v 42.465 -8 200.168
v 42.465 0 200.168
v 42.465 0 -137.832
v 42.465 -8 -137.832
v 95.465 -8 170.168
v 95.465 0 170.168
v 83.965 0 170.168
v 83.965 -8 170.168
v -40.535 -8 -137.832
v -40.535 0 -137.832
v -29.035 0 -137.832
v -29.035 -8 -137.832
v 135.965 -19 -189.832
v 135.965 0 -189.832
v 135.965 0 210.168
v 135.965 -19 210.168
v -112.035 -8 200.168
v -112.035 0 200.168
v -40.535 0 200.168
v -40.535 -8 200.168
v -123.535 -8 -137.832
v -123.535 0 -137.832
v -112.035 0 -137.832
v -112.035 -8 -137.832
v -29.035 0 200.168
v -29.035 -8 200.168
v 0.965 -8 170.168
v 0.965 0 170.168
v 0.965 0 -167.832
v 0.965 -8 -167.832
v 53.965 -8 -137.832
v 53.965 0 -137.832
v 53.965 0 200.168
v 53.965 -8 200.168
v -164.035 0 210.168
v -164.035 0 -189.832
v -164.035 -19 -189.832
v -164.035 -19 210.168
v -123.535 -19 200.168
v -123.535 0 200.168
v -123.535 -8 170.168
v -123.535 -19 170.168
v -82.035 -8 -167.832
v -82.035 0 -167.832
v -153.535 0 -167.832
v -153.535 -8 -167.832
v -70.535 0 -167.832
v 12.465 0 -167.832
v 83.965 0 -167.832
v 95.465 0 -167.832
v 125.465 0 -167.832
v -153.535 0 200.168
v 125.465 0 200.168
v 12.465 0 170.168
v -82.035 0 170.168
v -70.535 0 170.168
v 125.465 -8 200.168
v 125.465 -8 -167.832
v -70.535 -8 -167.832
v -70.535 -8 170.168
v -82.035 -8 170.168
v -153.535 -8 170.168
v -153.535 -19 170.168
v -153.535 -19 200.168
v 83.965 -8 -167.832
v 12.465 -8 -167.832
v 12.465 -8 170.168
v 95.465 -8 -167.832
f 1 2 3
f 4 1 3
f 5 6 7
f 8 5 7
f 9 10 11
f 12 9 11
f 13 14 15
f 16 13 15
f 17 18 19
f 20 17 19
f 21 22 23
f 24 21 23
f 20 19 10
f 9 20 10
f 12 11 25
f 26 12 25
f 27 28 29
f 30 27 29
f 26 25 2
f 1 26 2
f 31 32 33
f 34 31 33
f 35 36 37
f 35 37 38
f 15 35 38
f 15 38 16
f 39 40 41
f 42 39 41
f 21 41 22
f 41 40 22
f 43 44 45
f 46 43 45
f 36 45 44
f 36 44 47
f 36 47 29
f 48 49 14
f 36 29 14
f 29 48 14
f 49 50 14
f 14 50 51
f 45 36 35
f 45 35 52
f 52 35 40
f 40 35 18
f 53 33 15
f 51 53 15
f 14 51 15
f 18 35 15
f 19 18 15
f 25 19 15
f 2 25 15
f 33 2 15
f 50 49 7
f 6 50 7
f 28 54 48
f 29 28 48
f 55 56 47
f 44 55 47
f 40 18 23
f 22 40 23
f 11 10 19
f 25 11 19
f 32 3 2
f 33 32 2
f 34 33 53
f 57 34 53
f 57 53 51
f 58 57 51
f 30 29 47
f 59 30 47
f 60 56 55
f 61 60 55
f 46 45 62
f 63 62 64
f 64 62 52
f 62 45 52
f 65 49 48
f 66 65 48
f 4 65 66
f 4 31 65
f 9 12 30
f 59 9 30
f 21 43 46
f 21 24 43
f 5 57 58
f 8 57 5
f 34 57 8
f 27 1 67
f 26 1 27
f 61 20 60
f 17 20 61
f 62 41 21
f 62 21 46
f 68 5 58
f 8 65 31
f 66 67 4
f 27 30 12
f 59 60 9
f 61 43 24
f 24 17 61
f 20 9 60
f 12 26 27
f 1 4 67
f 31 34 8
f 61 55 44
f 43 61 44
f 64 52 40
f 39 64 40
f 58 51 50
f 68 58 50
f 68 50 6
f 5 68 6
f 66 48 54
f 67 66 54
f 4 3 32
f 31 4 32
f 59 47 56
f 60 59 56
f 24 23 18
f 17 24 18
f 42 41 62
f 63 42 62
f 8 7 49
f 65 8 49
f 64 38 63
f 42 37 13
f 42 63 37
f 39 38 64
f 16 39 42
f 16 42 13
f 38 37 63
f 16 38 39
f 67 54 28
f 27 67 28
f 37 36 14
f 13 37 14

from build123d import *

# Parameters (mm, degrees)
F0_W     = 300
F0_H     = 400
F1_DEPTH = 19
F3_DEPTH = 8
F4_W     = 30
F4_H     = 30
F5_DEPTH = 11


with BuildPart() as f1:
    # F0 (on Front) → F1 (new body)
    with BuildSketch(Plane.XZ):
        with Locations((-14.034653, 10.167784)):
            Rectangle(F0_W, F0_H)
    extrude(amount=F1_DEPTH)

    # F2 (on face) → F3 (cut)
    with BuildSketch(Plane(origin=(0, 0, 0), x_dir=(-1, 0, 0), z_dir=(0, 1, 0))):
        Polygon((-125.465347, 200.167784), (-125.465347, -167.832216), (-95.465347, -167.832216), (-95.465347, 170.167784), (-83.965347, 170.167784), (-83.965347, -167.832216), (-12.465347, -167.832216), (-12.465347, 170.167784), (-0.965347, 170.167784), (-0.965347, -167.832216), (70.534653, -167.832216), (70.534653, 170.167784), (82.034653, 170.167784), (82.034653, -167.832216), (153.534653, -167.832216), (153.534653, 200.167784), (123.534653, 200.167784), (123.534653, -137.832216), (112.034653, -137.832216), (112.034653, 200.167784), (40.534653, 200.167784), (40.534653, -137.832216), (29.034653, -137.832216), (29.034653, 200.167784), (-42.465347, 200.167784), (-42.465347, -137.832216), (-53.965347, -137.832216), (-53.965347, 200.167784), align=None)
    extrude(amount=-F3_DEPTH, mode=Mode.SUBTRACT)

    # F4 (on face) → F5 (cut)
    with BuildSketch(Plane(origin=(0, -8, 0), x_dir=(-1, 0, 0), z_dir=(0, 1, 0))):
        with Locations((138.534653, 185.167784)):
            Rectangle(F4_W, F4_H)
    extrude(amount=-F5_DEPTH, mode=Mode.SUBTRACT)


solid = f1.part
